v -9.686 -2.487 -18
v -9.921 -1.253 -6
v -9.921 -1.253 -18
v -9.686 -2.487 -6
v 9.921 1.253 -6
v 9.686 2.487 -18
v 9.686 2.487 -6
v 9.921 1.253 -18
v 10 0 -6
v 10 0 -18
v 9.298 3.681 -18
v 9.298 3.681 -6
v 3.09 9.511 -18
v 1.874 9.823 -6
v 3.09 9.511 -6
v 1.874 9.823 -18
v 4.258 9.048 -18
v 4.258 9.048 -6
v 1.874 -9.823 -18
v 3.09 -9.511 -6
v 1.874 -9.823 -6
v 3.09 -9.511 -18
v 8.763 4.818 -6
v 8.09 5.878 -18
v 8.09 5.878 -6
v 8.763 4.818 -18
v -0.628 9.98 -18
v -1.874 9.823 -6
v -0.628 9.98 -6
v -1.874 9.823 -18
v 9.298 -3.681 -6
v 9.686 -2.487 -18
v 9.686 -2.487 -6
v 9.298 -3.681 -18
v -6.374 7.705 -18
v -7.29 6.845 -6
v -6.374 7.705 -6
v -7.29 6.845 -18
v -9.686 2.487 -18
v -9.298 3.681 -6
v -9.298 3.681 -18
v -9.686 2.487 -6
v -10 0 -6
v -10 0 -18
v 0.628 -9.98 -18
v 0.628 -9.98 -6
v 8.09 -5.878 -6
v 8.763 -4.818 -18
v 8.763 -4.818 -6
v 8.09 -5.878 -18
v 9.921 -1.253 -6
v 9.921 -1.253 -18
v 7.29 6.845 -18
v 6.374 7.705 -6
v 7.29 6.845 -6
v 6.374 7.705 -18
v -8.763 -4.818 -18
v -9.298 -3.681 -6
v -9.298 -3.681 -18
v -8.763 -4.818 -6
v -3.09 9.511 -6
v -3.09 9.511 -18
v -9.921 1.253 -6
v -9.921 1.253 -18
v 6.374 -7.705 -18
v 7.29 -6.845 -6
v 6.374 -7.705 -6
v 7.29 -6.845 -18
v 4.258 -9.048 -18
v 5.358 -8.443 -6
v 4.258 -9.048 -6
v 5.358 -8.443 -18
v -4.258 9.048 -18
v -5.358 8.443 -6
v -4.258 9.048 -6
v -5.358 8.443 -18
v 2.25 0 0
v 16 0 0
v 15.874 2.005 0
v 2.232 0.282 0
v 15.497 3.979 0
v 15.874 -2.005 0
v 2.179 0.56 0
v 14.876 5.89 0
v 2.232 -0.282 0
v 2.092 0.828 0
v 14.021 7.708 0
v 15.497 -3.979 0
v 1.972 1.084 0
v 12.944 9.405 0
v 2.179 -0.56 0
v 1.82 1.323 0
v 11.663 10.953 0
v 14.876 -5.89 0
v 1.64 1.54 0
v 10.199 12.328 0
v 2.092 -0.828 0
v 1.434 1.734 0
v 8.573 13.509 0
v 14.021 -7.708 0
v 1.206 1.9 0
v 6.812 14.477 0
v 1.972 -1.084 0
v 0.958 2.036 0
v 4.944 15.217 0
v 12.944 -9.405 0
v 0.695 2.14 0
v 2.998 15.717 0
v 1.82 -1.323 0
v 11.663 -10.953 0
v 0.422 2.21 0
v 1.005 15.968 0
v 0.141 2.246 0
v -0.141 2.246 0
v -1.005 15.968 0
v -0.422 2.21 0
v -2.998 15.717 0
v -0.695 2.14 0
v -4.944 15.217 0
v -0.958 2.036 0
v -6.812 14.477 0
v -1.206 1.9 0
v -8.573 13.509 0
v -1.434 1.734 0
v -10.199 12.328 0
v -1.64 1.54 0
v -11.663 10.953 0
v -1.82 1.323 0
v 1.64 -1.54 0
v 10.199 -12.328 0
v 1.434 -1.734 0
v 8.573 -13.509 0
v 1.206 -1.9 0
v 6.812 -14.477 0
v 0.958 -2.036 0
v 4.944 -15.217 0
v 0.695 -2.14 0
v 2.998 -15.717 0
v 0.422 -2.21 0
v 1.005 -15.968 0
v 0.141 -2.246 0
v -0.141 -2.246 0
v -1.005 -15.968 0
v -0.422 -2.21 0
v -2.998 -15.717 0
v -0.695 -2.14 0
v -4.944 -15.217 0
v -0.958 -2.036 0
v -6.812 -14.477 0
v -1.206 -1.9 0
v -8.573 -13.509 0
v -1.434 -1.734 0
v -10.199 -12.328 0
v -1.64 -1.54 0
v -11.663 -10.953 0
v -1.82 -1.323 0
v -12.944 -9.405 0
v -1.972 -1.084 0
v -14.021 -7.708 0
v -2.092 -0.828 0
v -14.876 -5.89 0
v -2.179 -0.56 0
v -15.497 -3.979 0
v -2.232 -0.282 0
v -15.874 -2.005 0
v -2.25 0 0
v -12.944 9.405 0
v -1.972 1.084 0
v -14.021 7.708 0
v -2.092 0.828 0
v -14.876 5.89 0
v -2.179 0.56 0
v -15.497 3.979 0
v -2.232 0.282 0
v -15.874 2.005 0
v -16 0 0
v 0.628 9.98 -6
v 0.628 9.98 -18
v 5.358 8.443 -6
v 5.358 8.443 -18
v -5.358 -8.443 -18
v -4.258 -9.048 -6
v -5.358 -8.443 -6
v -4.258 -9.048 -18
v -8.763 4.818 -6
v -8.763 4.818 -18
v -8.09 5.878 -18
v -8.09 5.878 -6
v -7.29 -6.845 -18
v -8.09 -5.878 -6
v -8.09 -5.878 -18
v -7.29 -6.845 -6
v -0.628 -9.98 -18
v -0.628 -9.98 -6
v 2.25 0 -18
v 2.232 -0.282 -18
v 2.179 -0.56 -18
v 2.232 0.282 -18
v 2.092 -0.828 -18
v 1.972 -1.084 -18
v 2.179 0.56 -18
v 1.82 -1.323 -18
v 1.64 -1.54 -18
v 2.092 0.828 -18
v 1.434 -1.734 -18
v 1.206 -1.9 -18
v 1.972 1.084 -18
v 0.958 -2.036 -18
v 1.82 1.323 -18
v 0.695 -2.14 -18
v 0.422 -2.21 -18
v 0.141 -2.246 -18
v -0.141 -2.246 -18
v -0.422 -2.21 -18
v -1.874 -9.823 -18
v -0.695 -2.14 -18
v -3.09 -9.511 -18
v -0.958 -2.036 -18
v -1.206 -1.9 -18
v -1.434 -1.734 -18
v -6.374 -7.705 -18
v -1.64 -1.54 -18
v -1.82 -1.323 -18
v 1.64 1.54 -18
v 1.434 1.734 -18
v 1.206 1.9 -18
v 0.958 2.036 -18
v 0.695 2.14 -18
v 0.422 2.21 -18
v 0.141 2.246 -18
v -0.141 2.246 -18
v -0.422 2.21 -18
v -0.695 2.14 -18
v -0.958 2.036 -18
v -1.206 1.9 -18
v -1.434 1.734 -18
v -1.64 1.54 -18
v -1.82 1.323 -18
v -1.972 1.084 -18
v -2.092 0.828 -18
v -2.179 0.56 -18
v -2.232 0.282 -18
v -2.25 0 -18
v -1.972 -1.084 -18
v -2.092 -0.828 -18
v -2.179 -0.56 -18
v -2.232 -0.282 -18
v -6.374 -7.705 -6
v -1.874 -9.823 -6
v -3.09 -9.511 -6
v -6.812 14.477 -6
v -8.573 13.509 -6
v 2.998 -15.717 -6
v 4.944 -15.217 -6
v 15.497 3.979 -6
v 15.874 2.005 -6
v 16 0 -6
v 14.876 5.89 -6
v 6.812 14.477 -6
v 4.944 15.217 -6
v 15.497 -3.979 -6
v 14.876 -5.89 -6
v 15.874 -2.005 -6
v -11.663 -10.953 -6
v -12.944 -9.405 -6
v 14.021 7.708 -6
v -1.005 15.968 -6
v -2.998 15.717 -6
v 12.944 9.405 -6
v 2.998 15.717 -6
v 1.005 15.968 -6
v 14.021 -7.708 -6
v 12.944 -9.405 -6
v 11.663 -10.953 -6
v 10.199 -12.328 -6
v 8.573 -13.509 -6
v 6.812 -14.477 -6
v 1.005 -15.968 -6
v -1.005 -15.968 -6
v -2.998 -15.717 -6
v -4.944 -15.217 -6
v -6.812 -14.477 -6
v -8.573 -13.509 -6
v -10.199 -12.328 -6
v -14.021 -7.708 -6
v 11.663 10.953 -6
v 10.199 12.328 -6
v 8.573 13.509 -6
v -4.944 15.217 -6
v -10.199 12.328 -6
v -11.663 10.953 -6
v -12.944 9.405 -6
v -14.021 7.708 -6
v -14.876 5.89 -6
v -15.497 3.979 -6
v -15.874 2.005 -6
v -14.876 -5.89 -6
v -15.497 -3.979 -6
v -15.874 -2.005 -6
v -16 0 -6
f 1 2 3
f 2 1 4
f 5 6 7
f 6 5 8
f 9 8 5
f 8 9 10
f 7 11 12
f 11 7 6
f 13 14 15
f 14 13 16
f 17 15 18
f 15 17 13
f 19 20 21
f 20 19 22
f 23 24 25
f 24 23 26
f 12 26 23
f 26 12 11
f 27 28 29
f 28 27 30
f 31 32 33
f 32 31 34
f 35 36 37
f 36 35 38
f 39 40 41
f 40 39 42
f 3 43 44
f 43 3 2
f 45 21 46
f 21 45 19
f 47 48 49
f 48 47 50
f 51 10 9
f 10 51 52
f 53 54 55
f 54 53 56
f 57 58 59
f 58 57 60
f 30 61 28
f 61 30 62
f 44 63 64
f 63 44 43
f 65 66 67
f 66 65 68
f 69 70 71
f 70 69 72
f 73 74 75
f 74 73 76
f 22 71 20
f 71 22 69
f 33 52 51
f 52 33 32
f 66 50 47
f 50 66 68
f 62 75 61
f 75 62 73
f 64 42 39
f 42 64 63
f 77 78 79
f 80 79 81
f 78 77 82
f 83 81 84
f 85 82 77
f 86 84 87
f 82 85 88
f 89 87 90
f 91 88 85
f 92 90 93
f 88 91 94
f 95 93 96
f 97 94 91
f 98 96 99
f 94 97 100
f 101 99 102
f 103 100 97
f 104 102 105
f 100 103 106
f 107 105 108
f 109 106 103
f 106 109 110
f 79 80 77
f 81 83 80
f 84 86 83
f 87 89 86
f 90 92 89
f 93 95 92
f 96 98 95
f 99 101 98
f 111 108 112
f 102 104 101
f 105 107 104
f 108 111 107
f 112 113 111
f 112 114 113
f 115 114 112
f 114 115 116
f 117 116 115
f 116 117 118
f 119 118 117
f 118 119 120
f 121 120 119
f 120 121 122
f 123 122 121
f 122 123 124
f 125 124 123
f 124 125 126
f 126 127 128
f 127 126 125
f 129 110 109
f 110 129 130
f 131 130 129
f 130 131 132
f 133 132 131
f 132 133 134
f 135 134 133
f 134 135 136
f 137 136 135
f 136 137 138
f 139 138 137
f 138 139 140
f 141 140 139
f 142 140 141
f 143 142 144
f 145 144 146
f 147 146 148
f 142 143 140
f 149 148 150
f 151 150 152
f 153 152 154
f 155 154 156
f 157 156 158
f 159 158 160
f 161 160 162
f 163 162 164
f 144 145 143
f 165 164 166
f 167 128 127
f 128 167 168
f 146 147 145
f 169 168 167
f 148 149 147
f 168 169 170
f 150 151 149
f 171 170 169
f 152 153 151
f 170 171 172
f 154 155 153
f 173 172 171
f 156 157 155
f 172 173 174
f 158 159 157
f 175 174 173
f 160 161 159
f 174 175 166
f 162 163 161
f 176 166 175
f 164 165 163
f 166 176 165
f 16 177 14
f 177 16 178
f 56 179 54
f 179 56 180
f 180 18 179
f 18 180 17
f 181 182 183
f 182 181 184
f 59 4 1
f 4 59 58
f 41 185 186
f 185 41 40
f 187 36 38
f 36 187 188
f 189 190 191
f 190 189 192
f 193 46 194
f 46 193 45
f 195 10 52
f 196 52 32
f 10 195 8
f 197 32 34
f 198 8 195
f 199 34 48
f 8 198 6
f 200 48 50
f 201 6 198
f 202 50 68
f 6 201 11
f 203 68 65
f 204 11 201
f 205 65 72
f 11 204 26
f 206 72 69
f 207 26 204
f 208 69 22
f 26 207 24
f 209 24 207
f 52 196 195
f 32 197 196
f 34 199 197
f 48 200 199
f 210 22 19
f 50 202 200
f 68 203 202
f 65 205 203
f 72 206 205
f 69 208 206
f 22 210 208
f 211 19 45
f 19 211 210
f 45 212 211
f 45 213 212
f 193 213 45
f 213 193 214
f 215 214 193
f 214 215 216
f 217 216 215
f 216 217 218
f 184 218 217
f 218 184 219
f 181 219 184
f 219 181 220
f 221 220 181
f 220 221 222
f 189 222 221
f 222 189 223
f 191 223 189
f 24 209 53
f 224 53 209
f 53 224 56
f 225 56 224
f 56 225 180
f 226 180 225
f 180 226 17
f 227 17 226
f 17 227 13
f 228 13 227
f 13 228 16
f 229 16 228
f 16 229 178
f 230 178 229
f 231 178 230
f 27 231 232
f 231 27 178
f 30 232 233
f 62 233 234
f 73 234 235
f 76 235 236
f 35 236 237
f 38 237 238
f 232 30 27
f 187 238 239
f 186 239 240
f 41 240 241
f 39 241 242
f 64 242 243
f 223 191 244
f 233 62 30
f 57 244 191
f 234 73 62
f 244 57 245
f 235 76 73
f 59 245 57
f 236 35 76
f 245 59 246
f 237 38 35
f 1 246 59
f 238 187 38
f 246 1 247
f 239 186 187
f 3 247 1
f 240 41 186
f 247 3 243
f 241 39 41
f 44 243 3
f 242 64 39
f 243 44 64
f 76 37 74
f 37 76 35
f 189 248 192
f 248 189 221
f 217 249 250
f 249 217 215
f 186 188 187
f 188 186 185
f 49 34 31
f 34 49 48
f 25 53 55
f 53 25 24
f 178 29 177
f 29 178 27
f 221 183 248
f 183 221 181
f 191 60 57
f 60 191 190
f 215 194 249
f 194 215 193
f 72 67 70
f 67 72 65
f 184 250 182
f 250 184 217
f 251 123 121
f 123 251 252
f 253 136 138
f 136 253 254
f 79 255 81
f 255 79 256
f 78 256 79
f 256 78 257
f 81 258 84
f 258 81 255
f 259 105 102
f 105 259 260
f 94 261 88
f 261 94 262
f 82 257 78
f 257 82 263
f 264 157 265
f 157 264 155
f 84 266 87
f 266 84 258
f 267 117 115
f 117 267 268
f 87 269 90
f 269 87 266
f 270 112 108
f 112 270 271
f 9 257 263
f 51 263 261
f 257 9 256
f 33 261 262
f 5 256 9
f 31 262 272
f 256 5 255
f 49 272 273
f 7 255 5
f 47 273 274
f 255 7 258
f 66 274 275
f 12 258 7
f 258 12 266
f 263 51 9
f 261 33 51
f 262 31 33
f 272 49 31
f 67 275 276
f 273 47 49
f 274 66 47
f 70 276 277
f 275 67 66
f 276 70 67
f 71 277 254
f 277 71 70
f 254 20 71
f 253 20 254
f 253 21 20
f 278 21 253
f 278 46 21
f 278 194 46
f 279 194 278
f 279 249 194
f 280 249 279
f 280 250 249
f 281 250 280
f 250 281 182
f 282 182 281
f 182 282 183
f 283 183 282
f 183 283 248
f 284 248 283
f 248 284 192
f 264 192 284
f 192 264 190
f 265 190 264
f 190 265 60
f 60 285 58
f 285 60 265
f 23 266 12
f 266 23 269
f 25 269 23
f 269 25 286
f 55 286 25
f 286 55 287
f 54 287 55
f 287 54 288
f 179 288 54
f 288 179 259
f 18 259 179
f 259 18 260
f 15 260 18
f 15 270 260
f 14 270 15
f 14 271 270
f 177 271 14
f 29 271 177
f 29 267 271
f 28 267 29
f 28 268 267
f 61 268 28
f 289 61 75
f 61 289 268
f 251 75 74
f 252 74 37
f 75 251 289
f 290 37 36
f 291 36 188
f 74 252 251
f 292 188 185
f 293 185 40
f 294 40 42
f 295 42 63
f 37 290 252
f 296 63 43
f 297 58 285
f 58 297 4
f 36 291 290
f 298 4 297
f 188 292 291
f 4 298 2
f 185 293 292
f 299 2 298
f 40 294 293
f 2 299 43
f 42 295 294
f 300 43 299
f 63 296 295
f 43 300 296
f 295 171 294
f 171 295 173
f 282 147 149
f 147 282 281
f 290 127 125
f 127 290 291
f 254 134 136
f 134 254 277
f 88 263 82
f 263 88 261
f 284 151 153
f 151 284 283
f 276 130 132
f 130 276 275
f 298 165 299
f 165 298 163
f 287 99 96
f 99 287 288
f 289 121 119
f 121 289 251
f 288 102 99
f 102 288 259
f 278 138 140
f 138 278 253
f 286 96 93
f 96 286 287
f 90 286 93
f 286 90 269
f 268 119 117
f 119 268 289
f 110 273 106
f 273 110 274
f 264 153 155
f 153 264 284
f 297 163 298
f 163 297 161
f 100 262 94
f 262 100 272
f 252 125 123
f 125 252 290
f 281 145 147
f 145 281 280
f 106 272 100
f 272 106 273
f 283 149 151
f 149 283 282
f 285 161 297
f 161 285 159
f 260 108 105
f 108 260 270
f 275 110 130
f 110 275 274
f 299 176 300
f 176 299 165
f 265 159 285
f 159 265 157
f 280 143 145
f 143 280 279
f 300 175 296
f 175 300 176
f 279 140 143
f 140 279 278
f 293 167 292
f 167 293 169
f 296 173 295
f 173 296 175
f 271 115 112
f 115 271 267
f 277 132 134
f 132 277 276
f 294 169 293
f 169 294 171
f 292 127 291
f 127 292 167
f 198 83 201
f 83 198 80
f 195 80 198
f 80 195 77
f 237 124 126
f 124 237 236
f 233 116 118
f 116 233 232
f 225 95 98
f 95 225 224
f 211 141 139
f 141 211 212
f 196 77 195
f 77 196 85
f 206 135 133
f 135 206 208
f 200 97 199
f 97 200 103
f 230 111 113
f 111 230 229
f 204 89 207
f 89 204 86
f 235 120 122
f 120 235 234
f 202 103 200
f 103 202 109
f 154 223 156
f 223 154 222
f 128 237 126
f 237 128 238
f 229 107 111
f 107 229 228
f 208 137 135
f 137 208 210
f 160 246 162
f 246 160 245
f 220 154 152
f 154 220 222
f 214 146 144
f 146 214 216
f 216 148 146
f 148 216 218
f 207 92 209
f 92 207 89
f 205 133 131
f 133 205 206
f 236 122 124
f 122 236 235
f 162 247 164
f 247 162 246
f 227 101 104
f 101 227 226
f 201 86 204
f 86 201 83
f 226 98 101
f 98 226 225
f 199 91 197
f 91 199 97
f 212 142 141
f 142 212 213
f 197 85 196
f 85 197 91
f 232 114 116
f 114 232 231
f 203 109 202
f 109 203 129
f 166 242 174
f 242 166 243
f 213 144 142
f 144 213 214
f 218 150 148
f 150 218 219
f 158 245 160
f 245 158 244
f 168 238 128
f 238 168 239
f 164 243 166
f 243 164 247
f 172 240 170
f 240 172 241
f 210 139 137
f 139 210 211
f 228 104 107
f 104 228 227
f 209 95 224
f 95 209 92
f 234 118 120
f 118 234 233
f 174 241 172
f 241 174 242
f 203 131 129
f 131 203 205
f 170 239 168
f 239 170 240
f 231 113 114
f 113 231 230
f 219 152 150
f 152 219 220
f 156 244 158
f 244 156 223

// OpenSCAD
$fn = 50;


difference() {
	union() {
		translate(v = [0, 0, -18.0000000000]) {
			cylinder(h = 18, r = 10.0000000000);
		}
		translate(v = [0, 0, -6.0000000000]) {
			cylinder(h = 6, r = 16.0000000000);
		}
	}
	union() {
		#translate(v = [0, 0, -18]) {
			cylinder(h = 18, r = 2.2500000000);
		}
	}
}
